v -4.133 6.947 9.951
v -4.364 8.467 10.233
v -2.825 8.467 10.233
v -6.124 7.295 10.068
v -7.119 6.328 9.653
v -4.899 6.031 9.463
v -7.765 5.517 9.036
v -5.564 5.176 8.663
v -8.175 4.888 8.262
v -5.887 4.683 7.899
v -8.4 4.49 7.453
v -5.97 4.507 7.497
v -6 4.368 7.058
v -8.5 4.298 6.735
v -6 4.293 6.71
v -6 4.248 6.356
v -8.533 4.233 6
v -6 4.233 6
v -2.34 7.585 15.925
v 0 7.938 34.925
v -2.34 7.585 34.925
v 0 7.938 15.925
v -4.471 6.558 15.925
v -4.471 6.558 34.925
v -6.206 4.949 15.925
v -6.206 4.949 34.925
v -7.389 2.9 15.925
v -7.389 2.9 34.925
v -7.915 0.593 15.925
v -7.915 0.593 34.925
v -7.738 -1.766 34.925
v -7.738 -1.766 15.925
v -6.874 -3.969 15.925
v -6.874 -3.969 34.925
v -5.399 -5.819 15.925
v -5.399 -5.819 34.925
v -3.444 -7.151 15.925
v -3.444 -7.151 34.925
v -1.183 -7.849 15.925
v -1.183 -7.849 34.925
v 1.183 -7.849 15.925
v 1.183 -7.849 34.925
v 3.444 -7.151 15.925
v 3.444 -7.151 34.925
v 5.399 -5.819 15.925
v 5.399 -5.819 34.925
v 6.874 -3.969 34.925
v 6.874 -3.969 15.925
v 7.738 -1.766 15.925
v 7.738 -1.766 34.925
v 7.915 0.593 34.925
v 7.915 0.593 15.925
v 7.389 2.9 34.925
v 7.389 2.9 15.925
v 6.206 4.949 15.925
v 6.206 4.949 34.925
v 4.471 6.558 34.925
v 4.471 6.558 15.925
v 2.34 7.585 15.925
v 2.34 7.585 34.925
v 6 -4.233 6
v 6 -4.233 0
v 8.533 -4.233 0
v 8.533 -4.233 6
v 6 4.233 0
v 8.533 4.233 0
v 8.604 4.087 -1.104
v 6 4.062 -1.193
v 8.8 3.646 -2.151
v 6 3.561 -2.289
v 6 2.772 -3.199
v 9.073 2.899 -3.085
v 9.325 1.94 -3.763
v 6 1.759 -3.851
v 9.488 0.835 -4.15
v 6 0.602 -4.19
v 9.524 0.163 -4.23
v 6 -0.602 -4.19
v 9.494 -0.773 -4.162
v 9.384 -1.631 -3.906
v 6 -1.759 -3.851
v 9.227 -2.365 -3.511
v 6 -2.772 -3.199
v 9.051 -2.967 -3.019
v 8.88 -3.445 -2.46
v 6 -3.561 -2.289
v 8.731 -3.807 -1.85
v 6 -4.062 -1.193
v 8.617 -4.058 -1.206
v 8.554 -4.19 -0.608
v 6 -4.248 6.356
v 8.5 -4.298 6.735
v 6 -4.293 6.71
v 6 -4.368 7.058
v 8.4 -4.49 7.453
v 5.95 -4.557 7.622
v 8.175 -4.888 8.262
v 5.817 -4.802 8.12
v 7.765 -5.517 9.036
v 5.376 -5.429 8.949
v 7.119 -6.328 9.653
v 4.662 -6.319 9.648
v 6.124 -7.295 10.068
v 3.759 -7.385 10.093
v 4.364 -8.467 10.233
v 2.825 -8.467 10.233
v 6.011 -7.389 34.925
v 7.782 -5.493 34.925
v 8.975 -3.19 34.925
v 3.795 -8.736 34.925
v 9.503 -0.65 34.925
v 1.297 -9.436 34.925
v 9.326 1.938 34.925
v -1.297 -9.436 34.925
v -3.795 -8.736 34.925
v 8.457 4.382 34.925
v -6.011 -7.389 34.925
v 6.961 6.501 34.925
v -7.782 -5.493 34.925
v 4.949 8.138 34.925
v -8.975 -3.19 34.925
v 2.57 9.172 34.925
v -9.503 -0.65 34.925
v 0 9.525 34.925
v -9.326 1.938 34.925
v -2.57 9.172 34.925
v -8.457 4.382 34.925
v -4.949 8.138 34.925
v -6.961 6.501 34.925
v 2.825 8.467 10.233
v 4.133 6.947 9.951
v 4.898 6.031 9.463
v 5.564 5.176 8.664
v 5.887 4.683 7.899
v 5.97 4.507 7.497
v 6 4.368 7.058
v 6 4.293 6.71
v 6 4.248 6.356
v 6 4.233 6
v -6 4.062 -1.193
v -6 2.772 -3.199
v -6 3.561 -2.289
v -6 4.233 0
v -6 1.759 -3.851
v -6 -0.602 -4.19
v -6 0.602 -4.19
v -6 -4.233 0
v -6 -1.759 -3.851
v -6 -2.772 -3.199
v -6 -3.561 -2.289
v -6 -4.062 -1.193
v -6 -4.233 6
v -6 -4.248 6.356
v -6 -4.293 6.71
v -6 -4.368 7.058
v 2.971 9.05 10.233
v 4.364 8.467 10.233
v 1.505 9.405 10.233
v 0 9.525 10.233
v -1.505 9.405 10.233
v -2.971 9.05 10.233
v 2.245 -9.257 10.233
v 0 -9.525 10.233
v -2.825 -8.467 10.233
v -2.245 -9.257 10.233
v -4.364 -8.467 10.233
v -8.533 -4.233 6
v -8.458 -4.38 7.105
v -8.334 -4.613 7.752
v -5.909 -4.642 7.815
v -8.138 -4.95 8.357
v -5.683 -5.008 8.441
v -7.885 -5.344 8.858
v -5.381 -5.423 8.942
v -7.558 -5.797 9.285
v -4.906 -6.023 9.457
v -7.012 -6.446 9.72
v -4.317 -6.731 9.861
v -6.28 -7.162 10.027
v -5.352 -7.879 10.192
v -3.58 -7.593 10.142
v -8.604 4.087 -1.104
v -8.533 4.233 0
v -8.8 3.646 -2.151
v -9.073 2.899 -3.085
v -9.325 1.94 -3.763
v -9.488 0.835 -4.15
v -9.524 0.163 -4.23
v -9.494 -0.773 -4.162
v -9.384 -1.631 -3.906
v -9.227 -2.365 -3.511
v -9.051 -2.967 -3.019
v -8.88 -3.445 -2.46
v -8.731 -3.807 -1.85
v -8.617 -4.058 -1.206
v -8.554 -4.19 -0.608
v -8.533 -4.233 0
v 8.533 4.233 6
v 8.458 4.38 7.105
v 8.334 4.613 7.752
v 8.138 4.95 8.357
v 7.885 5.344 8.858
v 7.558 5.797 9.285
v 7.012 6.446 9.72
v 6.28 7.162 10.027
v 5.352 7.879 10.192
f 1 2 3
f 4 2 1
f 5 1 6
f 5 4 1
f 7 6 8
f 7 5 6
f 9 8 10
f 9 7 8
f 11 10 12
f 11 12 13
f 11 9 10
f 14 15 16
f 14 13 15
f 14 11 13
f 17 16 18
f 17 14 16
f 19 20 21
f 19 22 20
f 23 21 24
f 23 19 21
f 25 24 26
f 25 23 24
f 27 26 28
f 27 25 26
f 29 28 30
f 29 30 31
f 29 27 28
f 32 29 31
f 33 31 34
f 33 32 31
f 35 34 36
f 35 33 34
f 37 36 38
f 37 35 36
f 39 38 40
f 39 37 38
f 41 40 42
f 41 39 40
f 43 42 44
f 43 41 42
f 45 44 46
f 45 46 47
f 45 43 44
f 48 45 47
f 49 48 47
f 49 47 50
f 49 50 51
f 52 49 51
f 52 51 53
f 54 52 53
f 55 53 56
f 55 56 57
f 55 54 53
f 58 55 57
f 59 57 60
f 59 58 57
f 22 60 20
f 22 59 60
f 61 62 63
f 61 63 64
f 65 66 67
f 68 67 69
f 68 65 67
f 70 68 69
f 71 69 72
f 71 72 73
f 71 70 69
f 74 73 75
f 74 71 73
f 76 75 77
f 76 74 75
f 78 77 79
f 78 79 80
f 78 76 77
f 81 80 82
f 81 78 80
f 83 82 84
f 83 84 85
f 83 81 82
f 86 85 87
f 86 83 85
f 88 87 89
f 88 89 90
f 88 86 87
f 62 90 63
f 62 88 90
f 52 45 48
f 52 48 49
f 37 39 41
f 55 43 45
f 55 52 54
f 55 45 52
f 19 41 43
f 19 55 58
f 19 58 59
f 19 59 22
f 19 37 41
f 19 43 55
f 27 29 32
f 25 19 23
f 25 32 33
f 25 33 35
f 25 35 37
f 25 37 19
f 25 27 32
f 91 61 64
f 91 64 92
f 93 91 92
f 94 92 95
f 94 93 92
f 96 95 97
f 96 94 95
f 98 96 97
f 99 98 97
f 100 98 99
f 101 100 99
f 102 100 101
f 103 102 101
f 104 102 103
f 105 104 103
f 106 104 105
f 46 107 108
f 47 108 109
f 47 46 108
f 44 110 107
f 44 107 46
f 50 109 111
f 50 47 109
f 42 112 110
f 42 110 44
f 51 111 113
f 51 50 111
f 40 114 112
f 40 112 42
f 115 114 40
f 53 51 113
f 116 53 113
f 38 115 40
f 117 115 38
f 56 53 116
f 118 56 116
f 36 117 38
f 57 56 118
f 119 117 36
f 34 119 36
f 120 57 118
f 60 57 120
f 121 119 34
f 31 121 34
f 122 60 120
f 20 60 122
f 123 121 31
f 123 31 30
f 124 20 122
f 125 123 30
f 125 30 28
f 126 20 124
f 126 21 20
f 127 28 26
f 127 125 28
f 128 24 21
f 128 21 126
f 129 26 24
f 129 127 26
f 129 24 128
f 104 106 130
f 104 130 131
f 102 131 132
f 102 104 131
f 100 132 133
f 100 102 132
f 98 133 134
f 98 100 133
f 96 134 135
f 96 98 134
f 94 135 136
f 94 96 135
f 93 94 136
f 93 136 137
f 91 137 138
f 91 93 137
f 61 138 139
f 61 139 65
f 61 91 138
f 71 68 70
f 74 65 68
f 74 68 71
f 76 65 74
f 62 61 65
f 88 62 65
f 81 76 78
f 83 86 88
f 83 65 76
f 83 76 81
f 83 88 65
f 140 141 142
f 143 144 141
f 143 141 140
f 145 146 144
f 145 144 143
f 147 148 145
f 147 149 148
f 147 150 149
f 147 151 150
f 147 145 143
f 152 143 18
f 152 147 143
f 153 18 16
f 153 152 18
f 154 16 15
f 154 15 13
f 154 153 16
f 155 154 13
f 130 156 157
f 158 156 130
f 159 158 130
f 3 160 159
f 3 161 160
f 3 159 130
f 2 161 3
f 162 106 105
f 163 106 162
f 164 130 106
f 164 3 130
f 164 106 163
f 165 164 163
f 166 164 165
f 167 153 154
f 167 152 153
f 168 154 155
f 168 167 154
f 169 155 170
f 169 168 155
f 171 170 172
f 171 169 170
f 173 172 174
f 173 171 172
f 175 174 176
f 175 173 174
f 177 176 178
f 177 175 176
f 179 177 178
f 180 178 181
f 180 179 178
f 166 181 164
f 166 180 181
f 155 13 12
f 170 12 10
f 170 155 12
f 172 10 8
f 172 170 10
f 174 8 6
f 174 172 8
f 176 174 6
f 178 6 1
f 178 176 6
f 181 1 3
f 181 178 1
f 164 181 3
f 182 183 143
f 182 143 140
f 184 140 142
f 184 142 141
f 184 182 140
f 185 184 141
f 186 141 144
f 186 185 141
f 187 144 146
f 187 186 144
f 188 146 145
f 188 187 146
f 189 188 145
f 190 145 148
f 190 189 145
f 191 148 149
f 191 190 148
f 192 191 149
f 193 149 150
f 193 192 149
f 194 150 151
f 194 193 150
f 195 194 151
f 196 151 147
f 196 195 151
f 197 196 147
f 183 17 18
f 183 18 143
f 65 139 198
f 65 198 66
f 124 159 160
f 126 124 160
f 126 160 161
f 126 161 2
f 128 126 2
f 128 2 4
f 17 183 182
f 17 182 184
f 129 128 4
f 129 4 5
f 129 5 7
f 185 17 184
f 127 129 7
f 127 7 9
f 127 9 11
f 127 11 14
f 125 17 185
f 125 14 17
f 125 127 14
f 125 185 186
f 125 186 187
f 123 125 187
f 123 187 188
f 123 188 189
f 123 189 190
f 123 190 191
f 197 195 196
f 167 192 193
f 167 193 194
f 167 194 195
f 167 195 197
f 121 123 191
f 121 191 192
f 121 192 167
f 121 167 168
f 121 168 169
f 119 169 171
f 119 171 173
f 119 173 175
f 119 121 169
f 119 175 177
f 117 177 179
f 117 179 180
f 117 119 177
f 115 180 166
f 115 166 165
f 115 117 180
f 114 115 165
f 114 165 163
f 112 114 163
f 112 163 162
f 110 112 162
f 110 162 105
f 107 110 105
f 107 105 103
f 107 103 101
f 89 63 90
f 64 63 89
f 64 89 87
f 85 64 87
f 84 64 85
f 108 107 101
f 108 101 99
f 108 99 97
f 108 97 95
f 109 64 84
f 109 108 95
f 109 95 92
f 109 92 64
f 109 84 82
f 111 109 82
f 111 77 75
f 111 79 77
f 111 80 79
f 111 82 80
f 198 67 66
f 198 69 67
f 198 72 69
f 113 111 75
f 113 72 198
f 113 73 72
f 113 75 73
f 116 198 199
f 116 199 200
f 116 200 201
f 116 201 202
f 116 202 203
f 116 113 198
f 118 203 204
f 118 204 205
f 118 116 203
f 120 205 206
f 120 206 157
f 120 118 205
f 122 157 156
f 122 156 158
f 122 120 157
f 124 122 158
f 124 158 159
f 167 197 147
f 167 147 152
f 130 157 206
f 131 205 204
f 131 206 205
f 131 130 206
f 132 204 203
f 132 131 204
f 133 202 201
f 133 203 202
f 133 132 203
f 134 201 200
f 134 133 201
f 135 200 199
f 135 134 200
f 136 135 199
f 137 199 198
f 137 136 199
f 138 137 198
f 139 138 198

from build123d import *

# Parameters (mm, degrees)
CUT_EXTRUDE1_DEPTH      = 38.432697939
CUT_EXTRUDE1_DEPTH_BACK = 38.432697939
CUT_EXTRUDE2_DEPTH      = 38.432698083
CUT_EXTRUDE2_DEPTH_BACK = 38.432698083


with BuildPart() as part:
    # Sketch1 → Revolve1 (revolve)
    with BuildSketch(Plane(origin=(0, 0, 0), x_dir=(0, 0, -1), z_dir=(1, 0, 0))):
        Polygon((-34.925, 9.525), (-34.925, 7.9375), (-15.925, 7.9375), (-15.925, 0), (9.525, 0), (9.525, 9.525), align=None)
    revolve(axis=Axis((0, 0, 0), (0, 0, 1)))

    # Sketch3 → Cut-Extrude1 (cut, two sides: drawn at the far end of the back side and taken through both)
    with BuildSketch(Plane(origin=(0, 0, 0), x_dir=(0, 0, -1), z_dir=(1, 0, 0)).offset(-CUT_EXTRUDE1_DEPTH_BACK)):
        with BuildLine():
            Line((9.525, 9.525), (-10.233333333, 9.525))
            Line((-10.233333333, 9.525), (-10.233333333, 8.466666667))
            ThreePointArc((-10.233333333, 8.466666667), (-8.993418707, 5.47324796), (-6, 4.233333333))
            Line((-6, 4.233333333), (0, 4.233333333))
            ThreePointArc((0, 4.233333333), (4.233333333, 0), (0, -4.233333333))
            Line((0, -4.233333333), (-6, -4.233333333))
            ThreePointArc((-6, -4.233333333), (-8.993418707, -5.47324796), (-10.233333333, -8.466666667))
            Line((-10.233333333, -8.466666667), (-10.233333333, -9.525))
            Line((-10.233333333, -9.525), (9.525, -9.525))
            Line((9.525, -9.525), (9.525, 9.525))
        make_face()
    extrude(amount=CUT_EXTRUDE1_DEPTH + CUT_EXTRUDE1_DEPTH_BACK, mode=Mode.SUBTRACT)

    # Sketch4 → Cut-Extrude2 (cut, two sides: drawn at the far end of the back side and taken through both)
    with BuildSketch(Plane(origin=(0, 0, 0), x_dir=(1, 0, 0), z_dir=(0, 1, 0)).offset(-CUT_EXTRUDE2_DEPTH_BACK)):
        with BuildLine():
            Line((-2.825, -10.233333333), (2.825, -10.233333333))
            ThreePointArc((2.825, -10.233333333), (5.07006403, -9.303397364), (6, -7.058333333))
            Line((6, -7.058333333), (6, 4.233333333))
            Line((6, 4.233333333), (-6, 4.233333333))
            Line((-6, 4.233333333), (-6, -7.058333333))
            ThreePointArc((-6, -7.058333333), (-5.07006403, -9.303397364), (-2.825, -10.233333333))
        make_face()
    extrude(amount=CUT_EXTRUDE2_DEPTH + CUT_EXTRUDE2_DEPTH_BACK, mode=Mode.SUBTRACT)


solid = part.part
